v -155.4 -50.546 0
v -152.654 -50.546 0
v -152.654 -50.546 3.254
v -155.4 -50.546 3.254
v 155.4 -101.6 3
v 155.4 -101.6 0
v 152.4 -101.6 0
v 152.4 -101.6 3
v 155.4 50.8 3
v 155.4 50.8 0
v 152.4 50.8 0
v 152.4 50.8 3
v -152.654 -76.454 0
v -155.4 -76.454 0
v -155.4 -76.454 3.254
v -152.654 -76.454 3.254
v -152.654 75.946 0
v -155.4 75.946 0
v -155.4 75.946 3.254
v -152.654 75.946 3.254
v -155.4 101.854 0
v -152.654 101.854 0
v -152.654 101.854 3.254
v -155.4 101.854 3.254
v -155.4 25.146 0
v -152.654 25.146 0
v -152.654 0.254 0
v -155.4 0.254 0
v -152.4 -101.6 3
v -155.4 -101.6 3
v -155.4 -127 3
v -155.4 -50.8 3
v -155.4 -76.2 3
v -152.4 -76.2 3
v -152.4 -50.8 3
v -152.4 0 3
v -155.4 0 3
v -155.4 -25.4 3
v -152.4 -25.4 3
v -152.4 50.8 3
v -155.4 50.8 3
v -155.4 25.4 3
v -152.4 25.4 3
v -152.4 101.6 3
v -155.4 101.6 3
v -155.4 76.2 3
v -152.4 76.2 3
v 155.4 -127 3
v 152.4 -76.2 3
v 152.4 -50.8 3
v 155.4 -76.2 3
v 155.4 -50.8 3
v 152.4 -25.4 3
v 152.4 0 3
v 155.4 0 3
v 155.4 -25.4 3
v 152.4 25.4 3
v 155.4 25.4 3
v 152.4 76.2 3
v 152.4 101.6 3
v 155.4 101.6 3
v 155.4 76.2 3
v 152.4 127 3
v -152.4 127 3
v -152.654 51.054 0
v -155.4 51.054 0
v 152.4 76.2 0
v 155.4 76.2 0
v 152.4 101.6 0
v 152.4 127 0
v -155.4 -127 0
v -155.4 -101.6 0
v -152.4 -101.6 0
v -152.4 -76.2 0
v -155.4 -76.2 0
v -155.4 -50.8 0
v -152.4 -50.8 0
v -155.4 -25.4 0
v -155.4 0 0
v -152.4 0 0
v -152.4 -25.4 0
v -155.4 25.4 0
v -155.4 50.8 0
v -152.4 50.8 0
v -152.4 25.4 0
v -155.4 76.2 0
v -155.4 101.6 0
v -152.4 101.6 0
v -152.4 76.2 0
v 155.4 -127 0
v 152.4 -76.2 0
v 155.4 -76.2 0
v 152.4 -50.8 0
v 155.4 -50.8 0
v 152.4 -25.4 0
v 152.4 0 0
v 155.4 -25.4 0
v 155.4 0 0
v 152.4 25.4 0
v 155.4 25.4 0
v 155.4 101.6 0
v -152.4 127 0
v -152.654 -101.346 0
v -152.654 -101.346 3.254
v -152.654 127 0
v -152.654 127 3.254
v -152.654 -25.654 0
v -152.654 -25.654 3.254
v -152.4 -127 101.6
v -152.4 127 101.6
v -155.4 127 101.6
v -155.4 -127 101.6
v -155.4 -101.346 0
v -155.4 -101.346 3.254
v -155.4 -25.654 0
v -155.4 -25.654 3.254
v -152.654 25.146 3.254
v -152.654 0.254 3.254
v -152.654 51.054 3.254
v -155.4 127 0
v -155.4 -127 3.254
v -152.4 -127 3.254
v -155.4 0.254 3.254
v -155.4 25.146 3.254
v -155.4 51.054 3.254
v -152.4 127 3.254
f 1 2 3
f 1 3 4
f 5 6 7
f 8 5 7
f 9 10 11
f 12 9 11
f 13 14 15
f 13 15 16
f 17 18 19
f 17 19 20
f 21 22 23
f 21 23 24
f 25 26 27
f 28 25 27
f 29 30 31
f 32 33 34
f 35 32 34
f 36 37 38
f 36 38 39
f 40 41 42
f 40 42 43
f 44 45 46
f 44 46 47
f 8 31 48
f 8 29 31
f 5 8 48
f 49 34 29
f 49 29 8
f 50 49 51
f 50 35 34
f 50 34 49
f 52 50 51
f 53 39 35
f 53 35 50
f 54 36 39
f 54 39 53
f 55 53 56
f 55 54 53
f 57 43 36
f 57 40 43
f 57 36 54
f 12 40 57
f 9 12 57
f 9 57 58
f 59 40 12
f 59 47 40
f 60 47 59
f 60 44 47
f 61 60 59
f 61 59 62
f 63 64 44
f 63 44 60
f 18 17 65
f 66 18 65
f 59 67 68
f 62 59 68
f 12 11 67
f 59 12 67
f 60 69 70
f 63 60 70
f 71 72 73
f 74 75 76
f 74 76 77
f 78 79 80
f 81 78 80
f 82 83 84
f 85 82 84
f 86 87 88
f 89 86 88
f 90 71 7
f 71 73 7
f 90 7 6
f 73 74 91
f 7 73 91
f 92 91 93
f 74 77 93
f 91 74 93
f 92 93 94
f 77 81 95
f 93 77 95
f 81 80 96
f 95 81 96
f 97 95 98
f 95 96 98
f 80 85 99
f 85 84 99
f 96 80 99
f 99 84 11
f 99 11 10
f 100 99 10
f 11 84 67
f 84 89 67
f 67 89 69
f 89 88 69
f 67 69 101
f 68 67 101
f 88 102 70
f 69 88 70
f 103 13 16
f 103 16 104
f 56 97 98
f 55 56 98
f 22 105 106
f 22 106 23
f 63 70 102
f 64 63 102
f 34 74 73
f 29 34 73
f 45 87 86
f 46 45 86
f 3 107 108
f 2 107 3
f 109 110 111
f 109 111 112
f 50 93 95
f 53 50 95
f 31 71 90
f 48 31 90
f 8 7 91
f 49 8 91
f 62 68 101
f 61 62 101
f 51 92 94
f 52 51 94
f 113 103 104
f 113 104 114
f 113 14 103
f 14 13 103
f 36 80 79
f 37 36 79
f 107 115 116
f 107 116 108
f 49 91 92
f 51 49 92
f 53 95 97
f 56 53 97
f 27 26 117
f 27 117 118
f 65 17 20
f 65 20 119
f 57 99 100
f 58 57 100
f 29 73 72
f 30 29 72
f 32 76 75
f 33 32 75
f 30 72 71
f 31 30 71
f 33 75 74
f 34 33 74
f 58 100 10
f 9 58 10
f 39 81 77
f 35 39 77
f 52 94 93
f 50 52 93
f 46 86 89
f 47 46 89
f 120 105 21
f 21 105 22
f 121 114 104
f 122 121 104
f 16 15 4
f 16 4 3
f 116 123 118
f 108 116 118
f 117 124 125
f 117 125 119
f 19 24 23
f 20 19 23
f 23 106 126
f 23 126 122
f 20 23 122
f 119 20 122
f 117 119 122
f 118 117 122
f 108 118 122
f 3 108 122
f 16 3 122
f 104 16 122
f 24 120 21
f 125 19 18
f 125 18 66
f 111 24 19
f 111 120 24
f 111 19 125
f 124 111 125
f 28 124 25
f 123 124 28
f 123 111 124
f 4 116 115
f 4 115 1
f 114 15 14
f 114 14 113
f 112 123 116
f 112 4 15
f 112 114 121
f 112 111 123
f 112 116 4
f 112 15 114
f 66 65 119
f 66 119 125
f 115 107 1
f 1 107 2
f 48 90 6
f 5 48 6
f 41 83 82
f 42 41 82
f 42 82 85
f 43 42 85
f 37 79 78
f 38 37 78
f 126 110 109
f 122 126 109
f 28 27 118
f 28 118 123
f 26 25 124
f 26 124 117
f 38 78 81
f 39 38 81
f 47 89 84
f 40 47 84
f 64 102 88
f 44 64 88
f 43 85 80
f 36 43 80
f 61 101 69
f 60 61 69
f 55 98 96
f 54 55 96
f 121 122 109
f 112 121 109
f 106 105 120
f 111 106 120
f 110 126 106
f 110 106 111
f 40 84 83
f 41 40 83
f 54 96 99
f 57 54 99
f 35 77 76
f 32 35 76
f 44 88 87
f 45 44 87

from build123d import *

# Parameters (mm, degrees)
F2_DEPTH  = 3
F3_W      = 254
F3_H      = 101.6
F4_DEPTH  = 3
F5_OFFSET = 0.254


with BuildPart() as f2:
    # F1 (on Top) → F2 (new body)
    with BuildSketch(Plane.XY):
        Polygon((152.4, 127), (-152.4, 127), (-152.4, 101.6), (-155.4, 101.6), (-155.4, 76.2), (-152.4, 76.2), (-152.4, 50.8), (-155.4, 50.8), (-155.4, 25.4), (-152.4, 25.4), (-152.4, 0), (-155.4, 0), (-155.4, -25.4), (-152.4, -25.4), (-152.4, -50.8), (-155.4, -50.8), (-155.4, -76.2), (-152.4, -76.2), (-152.4, -101.6), (-155.4, -101.6), (-155.4, -127), (-152.4, -127), (152.4, -127), (155.4, -127), (155.4, -101.6), (152.4, -101.6), (152.4, -76.2), (155.4, -76.2), (155.4, -50.8), (152.4, -50.8), (152.4, -25.4), (155.4, -25.4), (155.4, 0), (152.4, 0), (152.4, 25.4), (155.4, 25.4), (155.4, 50.8), (152.4, 50.8), (152.4, 76.2), (155.4, 76.2), (155.4, 101.6), (152.4, 101.6), align=None)
    extrude(amount=F2_DEPTH)


with BuildPart() as f4:
    # F3 (on face) → F4 (new body, through all)
    with BuildSketch(Plane(origin=(-152.4, 0, 0), x_dir=(0, -1, 0), z_dir=(-1, 0, 0))):
        with Locations((0, 50.8)):
            Rectangle(F3_W, F3_H)
    extrude(amount=F4_DEPTH)

    # F5: cut F2, made larger all round first
    f5_tool = offset(f2.part, amount=F5_OFFSET, kind=Kind.INTERSECTION, mode=Mode.PRIVATE)
    add(f5_tool, mode=Mode.SUBTRACT)


solid = Compound([f2.part, f4.part])
